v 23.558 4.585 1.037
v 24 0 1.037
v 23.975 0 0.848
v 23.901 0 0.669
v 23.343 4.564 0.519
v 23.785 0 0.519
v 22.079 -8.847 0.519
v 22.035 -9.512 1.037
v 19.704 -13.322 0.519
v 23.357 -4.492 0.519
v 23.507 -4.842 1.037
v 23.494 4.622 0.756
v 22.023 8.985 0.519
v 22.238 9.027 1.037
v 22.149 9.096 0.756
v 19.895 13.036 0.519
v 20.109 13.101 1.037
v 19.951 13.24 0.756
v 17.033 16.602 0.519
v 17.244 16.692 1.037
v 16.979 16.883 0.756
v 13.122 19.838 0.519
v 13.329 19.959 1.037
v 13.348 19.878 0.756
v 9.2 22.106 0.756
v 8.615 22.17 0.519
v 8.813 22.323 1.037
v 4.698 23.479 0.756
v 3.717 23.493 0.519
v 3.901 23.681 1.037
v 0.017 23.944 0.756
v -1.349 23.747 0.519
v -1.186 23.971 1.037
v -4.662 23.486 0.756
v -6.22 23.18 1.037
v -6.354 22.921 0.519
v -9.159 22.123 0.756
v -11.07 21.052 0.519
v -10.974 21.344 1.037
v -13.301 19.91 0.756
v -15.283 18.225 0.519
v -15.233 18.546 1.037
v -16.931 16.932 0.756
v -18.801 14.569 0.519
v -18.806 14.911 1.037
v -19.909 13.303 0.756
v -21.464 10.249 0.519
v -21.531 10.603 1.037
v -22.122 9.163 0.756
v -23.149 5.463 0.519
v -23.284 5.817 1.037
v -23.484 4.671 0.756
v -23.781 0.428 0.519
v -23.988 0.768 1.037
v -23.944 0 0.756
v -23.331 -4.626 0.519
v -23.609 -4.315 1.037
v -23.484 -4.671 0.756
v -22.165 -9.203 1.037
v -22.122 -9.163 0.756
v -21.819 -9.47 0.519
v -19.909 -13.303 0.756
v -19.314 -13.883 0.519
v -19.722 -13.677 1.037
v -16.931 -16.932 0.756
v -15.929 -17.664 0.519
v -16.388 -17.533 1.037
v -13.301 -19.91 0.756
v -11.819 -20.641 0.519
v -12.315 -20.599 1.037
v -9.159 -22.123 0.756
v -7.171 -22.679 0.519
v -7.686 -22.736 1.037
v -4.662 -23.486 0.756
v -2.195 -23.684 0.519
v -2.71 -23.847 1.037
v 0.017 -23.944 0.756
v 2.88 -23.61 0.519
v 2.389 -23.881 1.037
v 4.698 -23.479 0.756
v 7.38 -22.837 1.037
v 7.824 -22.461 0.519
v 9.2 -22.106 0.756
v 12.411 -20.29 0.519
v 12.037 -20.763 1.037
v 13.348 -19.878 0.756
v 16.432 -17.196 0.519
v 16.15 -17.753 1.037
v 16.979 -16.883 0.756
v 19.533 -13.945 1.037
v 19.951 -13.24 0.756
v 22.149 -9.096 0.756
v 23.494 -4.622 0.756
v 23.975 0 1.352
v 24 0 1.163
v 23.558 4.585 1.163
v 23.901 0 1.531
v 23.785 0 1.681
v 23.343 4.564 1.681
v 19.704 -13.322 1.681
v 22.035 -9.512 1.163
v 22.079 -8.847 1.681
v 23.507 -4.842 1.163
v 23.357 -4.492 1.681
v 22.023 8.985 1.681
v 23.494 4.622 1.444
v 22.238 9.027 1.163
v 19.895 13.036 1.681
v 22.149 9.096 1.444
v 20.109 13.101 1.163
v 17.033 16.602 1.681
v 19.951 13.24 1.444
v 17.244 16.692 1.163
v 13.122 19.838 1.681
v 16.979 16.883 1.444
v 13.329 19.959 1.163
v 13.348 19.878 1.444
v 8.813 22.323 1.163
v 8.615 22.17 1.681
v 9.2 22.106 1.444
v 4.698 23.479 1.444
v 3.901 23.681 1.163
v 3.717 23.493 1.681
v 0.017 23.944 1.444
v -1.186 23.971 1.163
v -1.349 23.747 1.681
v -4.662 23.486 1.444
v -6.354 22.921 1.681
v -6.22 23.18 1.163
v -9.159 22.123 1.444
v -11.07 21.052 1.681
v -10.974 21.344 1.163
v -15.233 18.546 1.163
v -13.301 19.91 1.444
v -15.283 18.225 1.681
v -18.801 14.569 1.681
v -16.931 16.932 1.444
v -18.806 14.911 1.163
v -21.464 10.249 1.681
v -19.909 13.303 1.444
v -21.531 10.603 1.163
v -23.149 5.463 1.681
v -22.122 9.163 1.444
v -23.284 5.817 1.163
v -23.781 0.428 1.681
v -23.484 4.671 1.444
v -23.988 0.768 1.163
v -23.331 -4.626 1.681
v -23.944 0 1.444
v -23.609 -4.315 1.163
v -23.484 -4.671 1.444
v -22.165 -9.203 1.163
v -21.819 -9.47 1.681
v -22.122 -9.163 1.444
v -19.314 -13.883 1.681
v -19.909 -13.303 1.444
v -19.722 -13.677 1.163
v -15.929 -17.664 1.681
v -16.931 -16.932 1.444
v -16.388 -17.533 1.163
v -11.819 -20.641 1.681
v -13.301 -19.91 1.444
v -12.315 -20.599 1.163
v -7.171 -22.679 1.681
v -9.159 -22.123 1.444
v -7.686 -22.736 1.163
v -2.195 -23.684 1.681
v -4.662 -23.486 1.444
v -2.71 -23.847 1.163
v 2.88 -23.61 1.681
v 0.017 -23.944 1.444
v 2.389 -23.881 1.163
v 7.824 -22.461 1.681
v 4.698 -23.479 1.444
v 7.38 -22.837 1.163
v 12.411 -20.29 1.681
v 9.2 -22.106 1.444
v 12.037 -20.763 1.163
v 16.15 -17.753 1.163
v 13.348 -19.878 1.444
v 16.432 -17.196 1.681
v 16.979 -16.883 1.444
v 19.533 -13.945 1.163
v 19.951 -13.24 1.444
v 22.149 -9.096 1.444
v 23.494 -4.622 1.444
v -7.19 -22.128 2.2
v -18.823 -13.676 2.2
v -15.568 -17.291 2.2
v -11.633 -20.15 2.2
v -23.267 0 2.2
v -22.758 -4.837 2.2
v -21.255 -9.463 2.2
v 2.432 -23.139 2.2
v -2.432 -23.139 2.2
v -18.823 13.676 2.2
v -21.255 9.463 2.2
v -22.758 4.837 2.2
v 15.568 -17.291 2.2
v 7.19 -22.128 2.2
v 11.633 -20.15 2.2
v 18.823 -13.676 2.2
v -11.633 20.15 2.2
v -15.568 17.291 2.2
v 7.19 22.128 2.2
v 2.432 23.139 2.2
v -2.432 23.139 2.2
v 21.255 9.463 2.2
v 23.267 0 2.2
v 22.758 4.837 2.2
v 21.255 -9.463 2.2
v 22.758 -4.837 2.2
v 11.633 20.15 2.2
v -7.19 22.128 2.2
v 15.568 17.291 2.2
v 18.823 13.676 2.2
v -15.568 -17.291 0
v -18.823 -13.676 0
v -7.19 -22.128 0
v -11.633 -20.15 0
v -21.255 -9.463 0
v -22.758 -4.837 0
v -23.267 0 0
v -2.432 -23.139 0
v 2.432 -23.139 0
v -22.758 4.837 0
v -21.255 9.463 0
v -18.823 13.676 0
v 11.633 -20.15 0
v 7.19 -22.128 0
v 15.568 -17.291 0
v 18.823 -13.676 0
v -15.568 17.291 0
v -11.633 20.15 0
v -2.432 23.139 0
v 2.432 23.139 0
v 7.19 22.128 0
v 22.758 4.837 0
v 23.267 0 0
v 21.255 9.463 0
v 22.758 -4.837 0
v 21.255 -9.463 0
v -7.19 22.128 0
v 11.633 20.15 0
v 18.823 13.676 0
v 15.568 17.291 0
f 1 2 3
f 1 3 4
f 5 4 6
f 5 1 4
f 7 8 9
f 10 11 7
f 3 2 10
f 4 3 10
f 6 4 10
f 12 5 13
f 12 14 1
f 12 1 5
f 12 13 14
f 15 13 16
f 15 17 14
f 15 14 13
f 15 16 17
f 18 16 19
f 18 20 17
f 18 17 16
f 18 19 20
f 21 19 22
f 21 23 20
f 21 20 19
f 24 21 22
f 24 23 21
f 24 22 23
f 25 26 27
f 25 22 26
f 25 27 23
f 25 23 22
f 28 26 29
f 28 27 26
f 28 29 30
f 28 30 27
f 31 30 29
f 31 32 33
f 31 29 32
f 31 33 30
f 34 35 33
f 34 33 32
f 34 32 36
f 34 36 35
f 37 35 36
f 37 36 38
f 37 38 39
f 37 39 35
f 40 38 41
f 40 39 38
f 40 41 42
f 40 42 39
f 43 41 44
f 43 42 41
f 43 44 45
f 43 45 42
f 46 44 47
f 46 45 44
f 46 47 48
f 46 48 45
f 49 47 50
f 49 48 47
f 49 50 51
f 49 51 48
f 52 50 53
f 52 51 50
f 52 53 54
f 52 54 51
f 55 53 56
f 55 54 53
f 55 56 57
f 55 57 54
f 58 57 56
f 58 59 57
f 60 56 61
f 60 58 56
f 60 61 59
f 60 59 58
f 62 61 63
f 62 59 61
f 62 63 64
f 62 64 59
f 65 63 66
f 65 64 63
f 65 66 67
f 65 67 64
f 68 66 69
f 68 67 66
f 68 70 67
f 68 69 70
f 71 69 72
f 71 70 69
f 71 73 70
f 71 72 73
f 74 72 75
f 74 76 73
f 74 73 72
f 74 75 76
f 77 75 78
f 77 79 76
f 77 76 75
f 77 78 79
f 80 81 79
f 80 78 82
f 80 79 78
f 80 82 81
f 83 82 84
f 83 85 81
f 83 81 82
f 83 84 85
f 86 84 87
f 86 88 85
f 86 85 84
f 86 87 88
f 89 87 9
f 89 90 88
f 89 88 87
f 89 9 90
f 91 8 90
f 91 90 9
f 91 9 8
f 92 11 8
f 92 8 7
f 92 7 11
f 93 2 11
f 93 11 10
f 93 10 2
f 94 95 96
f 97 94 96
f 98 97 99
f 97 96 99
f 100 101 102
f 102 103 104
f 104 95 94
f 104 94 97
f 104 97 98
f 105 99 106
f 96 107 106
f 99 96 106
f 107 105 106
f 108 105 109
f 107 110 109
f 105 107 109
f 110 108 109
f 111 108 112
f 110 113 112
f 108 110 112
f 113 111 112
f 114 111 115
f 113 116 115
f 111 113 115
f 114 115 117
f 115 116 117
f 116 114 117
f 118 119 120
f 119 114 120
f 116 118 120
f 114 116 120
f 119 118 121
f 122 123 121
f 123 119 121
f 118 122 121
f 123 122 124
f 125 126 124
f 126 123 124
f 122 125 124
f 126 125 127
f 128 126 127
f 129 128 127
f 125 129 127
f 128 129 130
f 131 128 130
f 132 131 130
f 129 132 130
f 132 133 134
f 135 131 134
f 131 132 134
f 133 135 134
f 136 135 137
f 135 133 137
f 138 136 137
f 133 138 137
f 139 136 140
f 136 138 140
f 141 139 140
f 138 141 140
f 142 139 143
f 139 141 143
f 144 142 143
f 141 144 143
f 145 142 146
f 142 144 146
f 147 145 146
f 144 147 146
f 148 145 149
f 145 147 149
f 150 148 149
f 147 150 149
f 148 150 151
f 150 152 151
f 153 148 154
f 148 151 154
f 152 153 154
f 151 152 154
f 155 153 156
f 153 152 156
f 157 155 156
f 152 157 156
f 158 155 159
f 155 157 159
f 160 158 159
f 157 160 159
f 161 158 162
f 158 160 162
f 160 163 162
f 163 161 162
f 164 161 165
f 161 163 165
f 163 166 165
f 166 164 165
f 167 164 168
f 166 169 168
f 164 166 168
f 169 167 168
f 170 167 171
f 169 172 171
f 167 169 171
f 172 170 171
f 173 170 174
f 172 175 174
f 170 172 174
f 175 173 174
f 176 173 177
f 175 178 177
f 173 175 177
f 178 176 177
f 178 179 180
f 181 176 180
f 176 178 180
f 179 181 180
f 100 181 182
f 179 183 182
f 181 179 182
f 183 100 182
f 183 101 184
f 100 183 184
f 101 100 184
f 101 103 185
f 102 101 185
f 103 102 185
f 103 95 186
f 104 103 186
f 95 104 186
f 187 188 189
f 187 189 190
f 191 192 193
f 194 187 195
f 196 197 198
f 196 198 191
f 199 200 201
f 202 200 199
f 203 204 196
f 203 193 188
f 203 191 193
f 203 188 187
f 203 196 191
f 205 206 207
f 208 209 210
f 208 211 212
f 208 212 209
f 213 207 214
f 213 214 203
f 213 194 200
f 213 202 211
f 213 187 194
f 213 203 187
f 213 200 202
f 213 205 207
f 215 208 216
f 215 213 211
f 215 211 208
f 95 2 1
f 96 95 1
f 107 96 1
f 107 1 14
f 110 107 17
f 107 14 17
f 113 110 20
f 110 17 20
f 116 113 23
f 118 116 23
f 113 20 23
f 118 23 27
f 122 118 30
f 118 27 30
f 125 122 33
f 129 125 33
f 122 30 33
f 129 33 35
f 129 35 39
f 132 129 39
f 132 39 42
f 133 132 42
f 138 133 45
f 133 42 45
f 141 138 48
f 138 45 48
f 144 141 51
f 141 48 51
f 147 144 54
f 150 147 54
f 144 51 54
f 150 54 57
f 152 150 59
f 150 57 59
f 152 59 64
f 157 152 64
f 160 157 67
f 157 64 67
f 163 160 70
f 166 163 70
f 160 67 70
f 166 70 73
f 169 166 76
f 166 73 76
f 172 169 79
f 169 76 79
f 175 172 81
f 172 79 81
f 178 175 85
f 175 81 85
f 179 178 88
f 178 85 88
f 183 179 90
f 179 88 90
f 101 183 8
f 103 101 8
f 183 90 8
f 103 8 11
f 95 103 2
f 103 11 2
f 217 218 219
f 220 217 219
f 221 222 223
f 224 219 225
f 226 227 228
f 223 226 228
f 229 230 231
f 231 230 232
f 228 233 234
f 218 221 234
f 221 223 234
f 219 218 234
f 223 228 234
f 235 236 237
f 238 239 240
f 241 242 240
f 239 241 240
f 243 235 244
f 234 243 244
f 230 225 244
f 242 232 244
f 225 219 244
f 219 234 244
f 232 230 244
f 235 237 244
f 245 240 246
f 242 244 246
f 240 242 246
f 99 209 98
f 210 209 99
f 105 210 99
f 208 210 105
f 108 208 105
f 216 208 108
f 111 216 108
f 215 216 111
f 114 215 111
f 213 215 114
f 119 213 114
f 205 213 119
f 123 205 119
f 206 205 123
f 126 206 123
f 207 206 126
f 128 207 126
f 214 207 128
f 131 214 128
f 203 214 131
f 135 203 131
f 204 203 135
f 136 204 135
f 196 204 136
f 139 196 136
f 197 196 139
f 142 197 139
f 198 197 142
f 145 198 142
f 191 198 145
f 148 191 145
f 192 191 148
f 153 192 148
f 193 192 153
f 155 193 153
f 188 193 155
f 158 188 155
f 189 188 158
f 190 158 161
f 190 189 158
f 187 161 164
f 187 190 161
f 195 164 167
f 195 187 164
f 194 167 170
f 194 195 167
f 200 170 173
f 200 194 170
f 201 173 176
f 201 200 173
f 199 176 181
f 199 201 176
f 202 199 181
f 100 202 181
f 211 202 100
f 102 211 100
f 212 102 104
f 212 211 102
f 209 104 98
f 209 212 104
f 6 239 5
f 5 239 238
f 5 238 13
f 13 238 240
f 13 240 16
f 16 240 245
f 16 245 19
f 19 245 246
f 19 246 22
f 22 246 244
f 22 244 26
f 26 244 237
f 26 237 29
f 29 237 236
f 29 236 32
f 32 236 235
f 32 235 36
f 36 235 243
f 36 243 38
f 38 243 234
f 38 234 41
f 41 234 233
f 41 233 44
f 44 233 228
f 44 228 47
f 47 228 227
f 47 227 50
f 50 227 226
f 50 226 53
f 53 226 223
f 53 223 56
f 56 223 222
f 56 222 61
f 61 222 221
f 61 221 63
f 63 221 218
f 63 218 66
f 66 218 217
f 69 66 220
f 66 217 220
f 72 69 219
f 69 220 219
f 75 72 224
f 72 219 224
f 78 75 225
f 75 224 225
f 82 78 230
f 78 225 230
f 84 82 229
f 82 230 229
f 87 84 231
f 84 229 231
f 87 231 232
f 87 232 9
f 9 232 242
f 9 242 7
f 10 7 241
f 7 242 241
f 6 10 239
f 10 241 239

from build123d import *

# Parameters (mm, degrees)
SKETCH_R     = 24
PAD_DEPTH    = 2.2
CHAMFER_SIZE = 0.733333
FILLET_R     = 0.733333


with BuildPart() as part:
    # Sketch → Pad (new body)
    with BuildSketch(Plane.XY):
        Circle(SKETCH_R)
    extrude(amount=PAD_DEPTH)

    # Chamfer
    chamfer_edges = [part.edges().sort_by_distance(p)[0] for p in [
        (24, 0, 1.1),
        (-24, 0, 0),
        (-24, 0, 2.2),
    ]]
    chamfer(chamfer_edges, length=CHAMFER_SIZE)

    # Fillet
    fillet_edges = [part.edges().sort_by_distance(p)[0] for p in [
        (24, 0, 1.1),
        (-24, 0, 0.733333),
        (-24, 0, 1.466667),
    ]]
    fillet(fillet_edges, radius=FILLET_R)


solid = part.part
